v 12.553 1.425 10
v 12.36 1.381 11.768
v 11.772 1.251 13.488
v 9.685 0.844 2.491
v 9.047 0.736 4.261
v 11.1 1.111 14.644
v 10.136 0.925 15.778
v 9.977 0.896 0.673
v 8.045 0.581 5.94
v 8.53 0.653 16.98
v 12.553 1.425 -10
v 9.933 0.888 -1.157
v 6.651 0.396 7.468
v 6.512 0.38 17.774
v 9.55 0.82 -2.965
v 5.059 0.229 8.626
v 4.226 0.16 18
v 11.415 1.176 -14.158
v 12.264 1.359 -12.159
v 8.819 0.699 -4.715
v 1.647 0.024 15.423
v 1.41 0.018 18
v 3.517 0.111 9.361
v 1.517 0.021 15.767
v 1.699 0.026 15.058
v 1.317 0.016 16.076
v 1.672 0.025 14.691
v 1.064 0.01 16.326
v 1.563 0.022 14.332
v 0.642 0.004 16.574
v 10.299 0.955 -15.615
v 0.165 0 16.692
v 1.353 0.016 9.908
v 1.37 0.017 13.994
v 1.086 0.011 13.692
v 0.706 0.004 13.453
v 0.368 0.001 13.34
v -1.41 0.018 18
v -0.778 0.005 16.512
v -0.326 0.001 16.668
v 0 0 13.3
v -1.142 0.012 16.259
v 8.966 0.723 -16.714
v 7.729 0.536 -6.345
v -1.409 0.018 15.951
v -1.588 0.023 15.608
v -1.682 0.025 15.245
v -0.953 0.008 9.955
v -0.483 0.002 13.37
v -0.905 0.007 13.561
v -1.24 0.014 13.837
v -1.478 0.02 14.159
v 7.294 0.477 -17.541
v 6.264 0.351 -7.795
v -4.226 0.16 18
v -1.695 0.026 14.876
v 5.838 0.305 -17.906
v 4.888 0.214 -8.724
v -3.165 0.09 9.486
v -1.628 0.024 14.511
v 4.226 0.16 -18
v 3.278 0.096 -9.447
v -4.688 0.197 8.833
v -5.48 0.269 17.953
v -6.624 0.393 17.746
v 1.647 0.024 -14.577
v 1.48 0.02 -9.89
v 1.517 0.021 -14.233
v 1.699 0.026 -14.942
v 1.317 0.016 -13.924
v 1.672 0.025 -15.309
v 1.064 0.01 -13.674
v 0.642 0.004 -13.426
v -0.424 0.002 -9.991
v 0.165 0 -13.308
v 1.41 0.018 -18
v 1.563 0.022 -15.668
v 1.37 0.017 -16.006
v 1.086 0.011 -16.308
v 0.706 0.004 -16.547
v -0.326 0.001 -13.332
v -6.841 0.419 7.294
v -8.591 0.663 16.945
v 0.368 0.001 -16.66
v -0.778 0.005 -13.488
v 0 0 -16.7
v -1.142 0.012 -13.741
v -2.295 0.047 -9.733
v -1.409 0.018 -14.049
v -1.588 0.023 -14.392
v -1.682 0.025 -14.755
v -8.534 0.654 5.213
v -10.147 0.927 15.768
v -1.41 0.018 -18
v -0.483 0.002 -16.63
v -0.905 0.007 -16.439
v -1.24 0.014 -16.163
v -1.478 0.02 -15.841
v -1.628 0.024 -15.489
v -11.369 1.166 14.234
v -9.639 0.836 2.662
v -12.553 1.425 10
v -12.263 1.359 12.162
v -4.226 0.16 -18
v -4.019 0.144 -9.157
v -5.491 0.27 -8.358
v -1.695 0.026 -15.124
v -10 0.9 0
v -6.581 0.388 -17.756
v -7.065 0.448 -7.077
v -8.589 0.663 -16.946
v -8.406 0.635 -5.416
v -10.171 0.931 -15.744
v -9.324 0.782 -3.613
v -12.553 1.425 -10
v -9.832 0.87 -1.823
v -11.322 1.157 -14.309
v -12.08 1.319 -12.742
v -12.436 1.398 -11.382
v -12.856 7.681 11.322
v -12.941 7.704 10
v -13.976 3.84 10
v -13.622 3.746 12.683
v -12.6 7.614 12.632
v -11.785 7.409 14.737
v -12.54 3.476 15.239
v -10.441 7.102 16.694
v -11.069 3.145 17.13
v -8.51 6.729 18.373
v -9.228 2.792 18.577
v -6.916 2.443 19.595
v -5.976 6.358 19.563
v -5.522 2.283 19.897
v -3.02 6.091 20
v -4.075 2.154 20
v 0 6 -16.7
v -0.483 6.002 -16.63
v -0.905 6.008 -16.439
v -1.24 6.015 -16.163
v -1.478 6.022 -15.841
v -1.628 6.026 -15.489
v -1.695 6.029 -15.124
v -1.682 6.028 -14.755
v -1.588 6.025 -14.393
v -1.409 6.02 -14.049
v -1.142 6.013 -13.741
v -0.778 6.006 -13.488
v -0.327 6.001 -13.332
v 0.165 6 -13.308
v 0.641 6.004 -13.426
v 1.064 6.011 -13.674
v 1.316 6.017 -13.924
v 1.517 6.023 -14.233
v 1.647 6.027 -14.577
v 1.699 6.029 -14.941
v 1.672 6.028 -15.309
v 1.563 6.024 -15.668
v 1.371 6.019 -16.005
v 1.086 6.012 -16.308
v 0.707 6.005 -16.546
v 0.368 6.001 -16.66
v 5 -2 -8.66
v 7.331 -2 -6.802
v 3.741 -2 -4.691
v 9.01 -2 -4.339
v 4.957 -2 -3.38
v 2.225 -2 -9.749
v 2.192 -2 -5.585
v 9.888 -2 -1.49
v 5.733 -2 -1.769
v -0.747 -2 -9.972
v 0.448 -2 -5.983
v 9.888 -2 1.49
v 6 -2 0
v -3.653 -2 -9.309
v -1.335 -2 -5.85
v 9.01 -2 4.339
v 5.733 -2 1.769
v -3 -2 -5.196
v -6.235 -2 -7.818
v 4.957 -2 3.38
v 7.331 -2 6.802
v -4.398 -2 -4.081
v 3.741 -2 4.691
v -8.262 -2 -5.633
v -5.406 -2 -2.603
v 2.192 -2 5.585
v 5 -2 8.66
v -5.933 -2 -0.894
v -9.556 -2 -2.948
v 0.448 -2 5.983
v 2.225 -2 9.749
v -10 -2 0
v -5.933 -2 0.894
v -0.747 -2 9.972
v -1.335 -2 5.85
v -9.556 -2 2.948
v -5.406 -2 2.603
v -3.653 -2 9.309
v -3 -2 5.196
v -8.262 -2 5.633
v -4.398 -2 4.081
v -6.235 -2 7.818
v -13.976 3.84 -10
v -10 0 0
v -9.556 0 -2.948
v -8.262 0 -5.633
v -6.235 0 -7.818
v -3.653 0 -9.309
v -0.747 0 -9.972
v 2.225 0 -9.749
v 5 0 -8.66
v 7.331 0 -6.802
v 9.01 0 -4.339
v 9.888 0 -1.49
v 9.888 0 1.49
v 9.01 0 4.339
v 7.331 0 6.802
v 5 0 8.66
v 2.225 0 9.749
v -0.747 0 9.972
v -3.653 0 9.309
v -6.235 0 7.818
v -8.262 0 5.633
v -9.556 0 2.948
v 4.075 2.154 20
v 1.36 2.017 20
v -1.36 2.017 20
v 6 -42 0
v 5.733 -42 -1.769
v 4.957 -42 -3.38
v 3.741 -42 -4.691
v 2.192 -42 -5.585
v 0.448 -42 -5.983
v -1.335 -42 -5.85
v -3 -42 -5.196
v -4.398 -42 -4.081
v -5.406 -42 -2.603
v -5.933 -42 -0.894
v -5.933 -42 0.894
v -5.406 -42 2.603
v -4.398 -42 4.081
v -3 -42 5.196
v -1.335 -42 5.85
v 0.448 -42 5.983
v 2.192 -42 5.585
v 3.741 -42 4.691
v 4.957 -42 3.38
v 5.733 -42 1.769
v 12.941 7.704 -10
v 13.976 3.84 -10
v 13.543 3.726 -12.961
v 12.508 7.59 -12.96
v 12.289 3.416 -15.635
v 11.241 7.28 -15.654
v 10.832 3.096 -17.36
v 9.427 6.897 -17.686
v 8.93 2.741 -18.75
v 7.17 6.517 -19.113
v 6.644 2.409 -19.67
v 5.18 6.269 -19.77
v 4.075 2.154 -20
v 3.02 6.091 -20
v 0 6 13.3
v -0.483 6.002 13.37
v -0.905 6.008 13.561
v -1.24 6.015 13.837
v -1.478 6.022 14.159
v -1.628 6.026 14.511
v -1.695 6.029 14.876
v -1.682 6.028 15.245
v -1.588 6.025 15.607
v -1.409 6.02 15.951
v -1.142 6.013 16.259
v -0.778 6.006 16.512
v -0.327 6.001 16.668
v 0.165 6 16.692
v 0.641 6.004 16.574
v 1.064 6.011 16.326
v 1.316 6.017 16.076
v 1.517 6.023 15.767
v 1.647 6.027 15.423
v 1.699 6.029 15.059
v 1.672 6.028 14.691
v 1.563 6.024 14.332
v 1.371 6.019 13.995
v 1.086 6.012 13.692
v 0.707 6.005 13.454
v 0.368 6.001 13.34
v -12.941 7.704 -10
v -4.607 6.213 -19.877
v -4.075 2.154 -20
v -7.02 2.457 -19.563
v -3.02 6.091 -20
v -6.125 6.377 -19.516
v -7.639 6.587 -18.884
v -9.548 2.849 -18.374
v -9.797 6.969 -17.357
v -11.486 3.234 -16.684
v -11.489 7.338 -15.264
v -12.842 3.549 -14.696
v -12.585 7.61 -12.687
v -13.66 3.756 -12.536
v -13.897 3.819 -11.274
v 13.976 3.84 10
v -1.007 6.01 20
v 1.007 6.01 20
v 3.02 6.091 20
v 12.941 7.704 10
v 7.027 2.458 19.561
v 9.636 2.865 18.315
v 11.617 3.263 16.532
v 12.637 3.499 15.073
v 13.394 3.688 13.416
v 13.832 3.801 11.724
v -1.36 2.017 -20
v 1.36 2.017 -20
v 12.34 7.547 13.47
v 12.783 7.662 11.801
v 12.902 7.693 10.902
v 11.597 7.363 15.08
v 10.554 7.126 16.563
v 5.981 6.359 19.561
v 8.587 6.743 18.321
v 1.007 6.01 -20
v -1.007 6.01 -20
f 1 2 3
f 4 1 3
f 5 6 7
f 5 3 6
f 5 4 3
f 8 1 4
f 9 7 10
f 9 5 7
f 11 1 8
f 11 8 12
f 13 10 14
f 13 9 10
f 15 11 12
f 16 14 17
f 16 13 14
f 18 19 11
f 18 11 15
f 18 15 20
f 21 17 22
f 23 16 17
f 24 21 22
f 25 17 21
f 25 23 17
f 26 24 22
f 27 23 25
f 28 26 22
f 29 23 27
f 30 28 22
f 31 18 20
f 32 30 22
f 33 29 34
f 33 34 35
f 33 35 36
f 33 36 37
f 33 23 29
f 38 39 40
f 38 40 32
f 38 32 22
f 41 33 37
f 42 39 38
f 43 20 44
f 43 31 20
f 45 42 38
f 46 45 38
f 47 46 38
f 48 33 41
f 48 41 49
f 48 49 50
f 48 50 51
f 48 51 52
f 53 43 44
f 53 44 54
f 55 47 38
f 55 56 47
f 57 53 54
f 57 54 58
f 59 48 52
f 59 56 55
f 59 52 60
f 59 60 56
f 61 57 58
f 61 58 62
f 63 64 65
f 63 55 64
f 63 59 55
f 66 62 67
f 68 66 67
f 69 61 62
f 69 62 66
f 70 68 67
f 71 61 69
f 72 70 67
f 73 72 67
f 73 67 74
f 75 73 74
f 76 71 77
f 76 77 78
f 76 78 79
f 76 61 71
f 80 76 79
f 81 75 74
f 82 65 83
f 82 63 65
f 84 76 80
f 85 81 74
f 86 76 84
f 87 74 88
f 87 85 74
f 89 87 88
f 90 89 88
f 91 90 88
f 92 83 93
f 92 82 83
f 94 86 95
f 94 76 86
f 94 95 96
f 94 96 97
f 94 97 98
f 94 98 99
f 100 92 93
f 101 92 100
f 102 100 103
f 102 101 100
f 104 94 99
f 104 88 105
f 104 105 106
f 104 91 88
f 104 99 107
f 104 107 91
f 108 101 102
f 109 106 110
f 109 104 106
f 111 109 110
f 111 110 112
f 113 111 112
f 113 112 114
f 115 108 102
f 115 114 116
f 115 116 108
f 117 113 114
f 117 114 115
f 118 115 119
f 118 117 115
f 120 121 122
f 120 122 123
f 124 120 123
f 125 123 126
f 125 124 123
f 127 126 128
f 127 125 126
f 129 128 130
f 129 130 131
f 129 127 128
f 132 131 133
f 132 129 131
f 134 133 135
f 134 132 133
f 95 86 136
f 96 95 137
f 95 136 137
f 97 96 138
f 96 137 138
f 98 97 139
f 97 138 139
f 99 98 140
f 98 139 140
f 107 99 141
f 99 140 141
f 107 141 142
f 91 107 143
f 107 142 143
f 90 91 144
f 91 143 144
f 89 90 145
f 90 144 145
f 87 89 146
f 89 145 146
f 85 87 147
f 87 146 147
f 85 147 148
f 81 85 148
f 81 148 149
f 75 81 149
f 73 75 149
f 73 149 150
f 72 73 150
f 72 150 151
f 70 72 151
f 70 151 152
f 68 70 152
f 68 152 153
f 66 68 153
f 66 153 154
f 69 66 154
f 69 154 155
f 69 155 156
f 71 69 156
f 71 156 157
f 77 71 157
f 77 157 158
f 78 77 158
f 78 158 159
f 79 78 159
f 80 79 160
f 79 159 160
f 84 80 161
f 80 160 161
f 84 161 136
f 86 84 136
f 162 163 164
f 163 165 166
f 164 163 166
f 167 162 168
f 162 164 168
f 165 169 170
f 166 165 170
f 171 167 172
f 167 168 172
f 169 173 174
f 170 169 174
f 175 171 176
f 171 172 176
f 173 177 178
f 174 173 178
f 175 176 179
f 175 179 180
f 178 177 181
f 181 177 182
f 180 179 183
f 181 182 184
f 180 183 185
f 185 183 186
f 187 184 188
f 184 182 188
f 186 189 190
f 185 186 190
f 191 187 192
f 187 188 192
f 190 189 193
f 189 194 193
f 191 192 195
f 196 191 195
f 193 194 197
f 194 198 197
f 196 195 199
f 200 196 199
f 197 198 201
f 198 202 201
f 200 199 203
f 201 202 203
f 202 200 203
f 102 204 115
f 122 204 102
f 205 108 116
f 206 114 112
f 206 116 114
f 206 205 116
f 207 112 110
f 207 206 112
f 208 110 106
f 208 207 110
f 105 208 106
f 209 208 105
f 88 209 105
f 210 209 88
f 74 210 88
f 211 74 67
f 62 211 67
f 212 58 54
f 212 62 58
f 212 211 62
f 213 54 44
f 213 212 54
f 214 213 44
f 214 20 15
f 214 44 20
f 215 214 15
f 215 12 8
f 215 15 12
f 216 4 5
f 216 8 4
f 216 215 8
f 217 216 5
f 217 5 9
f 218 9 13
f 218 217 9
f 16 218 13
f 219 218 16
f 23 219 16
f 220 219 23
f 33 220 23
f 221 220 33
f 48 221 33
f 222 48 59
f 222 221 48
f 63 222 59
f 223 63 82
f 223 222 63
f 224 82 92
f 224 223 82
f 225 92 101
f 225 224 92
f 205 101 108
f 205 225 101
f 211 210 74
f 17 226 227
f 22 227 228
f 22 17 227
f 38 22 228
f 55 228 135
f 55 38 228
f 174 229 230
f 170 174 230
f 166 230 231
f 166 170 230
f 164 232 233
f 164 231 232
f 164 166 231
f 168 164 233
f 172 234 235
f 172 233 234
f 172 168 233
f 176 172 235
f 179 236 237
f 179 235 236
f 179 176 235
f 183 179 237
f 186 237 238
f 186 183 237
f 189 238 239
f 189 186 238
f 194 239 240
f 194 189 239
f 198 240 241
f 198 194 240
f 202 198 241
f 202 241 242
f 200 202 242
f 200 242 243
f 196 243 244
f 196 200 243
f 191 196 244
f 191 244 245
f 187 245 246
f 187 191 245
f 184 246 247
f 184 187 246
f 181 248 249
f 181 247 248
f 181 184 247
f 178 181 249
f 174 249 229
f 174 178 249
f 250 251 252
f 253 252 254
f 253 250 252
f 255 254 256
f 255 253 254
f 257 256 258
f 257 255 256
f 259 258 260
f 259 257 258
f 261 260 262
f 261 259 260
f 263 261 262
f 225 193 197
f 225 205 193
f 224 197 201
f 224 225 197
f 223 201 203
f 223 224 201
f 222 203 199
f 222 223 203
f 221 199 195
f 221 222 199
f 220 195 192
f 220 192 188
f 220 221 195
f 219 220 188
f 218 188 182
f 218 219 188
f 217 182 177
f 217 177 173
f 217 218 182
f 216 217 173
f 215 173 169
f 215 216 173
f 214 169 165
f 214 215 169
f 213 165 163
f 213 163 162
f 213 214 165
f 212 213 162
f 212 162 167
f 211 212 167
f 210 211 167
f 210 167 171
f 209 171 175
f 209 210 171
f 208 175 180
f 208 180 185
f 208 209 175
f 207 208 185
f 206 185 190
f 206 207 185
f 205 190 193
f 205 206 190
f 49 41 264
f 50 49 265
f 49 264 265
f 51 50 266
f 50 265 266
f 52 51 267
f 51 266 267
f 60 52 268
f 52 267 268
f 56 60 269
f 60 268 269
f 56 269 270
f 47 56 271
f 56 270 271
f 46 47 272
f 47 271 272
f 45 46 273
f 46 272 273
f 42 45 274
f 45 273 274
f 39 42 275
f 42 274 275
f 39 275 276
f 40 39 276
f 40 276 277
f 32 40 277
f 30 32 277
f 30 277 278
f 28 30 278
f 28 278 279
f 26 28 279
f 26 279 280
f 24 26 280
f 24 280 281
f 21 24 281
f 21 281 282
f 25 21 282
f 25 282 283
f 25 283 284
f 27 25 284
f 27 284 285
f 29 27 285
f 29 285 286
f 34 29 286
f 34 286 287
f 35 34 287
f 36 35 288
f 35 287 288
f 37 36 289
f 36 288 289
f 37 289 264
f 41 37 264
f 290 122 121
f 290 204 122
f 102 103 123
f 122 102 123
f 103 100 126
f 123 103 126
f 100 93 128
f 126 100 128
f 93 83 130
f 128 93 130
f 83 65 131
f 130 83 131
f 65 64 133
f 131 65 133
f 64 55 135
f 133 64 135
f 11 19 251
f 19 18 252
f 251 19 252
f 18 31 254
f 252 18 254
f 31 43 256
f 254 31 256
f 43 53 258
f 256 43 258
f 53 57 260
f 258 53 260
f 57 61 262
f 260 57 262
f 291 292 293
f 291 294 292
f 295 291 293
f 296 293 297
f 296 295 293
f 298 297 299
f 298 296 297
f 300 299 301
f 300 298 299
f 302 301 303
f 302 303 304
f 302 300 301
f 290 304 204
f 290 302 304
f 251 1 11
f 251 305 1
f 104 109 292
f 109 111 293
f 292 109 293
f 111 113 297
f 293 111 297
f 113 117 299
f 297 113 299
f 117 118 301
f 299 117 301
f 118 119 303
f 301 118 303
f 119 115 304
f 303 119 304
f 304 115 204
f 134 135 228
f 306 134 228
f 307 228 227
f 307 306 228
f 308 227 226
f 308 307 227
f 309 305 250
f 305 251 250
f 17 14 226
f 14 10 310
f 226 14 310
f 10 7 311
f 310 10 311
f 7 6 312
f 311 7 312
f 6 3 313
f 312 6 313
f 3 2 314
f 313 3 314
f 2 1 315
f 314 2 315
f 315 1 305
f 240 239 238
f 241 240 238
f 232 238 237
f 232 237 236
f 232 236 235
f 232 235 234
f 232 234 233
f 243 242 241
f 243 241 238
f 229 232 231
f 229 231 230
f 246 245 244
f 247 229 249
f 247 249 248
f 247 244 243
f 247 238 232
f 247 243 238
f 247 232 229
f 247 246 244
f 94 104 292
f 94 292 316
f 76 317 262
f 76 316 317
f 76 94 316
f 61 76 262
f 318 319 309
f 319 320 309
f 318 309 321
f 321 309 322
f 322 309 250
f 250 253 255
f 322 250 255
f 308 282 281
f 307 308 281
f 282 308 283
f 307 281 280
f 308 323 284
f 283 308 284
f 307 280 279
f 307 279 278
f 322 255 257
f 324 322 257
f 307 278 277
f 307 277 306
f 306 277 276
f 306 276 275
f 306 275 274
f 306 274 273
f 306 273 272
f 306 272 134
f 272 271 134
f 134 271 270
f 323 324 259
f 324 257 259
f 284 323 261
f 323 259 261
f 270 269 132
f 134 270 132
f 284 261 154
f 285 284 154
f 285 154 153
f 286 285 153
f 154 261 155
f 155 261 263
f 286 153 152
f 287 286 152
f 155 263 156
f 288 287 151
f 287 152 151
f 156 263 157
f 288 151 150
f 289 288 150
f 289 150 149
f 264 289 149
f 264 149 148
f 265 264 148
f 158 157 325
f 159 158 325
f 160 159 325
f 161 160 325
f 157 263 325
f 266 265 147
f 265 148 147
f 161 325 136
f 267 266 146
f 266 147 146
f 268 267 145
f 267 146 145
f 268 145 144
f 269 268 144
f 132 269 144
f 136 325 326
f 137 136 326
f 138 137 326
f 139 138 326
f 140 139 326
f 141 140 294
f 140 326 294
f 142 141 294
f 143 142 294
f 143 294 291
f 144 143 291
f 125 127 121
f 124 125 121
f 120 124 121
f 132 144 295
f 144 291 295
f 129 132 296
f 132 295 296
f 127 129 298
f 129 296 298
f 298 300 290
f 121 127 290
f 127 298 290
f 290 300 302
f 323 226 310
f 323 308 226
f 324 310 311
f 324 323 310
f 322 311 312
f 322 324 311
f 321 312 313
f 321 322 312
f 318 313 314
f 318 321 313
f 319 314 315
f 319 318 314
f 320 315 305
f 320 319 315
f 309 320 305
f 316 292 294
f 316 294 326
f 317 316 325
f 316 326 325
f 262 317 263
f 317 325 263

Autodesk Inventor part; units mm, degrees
ref_plane "YZ Plane" through (0, 0, 0) normal (1, 0, 0) x (0, 1, 0)
ref_plane "XZ Plane" through (0, 0, 0) normal (0, 1, 0) x (-1, 0, 0)
ref_plane "XY Plane" through (0, 0, 0) normal (0, 0, 1) x (1, 0, 0)
sketch "Sketch1" plane through (0, 0, 0) normal (0, 0, 1) x (1, 0, 0)
  arc A0 (-12.941, 7.7037) -> (12.941, 7.7037) centre (0, 56) ccw
  arc A1 (-14.4939, 1.9082) -> (14.4939, 1.9082) centre (0, 56) ccw
  line L0 (-14.4939, 1.9082) -> (-12.941, 7.7037)
  line L1 (14.4939, 1.9082) -> (12.941, 7.7037)
  line L2 (0, -11.2) -> (0, 67.2) construction
  point P0 (0, 0)
  dimension "d0" = 6
  dimension "d1" = 50
  dimension "d2" = 30
extrude "Extrusion1" add sketch "Sketch1" along normal mid plane 40
sketch "Sketch2" plane through (0, 0, 0) normal (0, 1, 0) x (-1, 0, 0)
  point P0 (0, 0)
  point P1 (0, -15)
  point P2 (0, 15)
  dimension "d5" = 15
  dimension "d6" = 15
hole "Hole1" at (0, 0, -15) at (0, 0, 15) direction (0, 1, 0) diameter 3.4 end through all clearance for "Socket Head Cap Screw DIN EN ISO 4762" size "M3" standard "DIN"
sketch "Sketch4" plane through (0, 0, 0) normal (0, 1, 0) x (-1, 0, 0)
  circle A0 centre (0, 0) radius 10
  dimension "d20" = 20
extrude "Extrusion3" add sketch "Sketch4" along normal up to surface
extrude "Extrusion4" add sketch "Sketch4" against normal blind 2
fillet "Fillet2" radius 10 4 edges at (-13.7174, 4.8059, -20) (13.7174, 4.8059, -20) (13.7174, 4.8059, 20) (-13.7174, 4.8059, 20)
sketch "Sketch6" plane through (0, -2, 0) normal (0, -1, 0) x (1, 0, 0)
  circle A0 centre (0, 0) radius 6
  dimension "d27" = 12
extrude "Extrusion5" add sketch "Sketch6" along normal blind 40
chamfer "Chamfer1" distance 2 angle 45 4 edges at (14.4939, 1.9082, 0) (0, 0, -20) (-14.4939, 1.9082, 0) (0, 0, 20)
equation "\"d6\" = d5"
properties part number "Mount_A"
